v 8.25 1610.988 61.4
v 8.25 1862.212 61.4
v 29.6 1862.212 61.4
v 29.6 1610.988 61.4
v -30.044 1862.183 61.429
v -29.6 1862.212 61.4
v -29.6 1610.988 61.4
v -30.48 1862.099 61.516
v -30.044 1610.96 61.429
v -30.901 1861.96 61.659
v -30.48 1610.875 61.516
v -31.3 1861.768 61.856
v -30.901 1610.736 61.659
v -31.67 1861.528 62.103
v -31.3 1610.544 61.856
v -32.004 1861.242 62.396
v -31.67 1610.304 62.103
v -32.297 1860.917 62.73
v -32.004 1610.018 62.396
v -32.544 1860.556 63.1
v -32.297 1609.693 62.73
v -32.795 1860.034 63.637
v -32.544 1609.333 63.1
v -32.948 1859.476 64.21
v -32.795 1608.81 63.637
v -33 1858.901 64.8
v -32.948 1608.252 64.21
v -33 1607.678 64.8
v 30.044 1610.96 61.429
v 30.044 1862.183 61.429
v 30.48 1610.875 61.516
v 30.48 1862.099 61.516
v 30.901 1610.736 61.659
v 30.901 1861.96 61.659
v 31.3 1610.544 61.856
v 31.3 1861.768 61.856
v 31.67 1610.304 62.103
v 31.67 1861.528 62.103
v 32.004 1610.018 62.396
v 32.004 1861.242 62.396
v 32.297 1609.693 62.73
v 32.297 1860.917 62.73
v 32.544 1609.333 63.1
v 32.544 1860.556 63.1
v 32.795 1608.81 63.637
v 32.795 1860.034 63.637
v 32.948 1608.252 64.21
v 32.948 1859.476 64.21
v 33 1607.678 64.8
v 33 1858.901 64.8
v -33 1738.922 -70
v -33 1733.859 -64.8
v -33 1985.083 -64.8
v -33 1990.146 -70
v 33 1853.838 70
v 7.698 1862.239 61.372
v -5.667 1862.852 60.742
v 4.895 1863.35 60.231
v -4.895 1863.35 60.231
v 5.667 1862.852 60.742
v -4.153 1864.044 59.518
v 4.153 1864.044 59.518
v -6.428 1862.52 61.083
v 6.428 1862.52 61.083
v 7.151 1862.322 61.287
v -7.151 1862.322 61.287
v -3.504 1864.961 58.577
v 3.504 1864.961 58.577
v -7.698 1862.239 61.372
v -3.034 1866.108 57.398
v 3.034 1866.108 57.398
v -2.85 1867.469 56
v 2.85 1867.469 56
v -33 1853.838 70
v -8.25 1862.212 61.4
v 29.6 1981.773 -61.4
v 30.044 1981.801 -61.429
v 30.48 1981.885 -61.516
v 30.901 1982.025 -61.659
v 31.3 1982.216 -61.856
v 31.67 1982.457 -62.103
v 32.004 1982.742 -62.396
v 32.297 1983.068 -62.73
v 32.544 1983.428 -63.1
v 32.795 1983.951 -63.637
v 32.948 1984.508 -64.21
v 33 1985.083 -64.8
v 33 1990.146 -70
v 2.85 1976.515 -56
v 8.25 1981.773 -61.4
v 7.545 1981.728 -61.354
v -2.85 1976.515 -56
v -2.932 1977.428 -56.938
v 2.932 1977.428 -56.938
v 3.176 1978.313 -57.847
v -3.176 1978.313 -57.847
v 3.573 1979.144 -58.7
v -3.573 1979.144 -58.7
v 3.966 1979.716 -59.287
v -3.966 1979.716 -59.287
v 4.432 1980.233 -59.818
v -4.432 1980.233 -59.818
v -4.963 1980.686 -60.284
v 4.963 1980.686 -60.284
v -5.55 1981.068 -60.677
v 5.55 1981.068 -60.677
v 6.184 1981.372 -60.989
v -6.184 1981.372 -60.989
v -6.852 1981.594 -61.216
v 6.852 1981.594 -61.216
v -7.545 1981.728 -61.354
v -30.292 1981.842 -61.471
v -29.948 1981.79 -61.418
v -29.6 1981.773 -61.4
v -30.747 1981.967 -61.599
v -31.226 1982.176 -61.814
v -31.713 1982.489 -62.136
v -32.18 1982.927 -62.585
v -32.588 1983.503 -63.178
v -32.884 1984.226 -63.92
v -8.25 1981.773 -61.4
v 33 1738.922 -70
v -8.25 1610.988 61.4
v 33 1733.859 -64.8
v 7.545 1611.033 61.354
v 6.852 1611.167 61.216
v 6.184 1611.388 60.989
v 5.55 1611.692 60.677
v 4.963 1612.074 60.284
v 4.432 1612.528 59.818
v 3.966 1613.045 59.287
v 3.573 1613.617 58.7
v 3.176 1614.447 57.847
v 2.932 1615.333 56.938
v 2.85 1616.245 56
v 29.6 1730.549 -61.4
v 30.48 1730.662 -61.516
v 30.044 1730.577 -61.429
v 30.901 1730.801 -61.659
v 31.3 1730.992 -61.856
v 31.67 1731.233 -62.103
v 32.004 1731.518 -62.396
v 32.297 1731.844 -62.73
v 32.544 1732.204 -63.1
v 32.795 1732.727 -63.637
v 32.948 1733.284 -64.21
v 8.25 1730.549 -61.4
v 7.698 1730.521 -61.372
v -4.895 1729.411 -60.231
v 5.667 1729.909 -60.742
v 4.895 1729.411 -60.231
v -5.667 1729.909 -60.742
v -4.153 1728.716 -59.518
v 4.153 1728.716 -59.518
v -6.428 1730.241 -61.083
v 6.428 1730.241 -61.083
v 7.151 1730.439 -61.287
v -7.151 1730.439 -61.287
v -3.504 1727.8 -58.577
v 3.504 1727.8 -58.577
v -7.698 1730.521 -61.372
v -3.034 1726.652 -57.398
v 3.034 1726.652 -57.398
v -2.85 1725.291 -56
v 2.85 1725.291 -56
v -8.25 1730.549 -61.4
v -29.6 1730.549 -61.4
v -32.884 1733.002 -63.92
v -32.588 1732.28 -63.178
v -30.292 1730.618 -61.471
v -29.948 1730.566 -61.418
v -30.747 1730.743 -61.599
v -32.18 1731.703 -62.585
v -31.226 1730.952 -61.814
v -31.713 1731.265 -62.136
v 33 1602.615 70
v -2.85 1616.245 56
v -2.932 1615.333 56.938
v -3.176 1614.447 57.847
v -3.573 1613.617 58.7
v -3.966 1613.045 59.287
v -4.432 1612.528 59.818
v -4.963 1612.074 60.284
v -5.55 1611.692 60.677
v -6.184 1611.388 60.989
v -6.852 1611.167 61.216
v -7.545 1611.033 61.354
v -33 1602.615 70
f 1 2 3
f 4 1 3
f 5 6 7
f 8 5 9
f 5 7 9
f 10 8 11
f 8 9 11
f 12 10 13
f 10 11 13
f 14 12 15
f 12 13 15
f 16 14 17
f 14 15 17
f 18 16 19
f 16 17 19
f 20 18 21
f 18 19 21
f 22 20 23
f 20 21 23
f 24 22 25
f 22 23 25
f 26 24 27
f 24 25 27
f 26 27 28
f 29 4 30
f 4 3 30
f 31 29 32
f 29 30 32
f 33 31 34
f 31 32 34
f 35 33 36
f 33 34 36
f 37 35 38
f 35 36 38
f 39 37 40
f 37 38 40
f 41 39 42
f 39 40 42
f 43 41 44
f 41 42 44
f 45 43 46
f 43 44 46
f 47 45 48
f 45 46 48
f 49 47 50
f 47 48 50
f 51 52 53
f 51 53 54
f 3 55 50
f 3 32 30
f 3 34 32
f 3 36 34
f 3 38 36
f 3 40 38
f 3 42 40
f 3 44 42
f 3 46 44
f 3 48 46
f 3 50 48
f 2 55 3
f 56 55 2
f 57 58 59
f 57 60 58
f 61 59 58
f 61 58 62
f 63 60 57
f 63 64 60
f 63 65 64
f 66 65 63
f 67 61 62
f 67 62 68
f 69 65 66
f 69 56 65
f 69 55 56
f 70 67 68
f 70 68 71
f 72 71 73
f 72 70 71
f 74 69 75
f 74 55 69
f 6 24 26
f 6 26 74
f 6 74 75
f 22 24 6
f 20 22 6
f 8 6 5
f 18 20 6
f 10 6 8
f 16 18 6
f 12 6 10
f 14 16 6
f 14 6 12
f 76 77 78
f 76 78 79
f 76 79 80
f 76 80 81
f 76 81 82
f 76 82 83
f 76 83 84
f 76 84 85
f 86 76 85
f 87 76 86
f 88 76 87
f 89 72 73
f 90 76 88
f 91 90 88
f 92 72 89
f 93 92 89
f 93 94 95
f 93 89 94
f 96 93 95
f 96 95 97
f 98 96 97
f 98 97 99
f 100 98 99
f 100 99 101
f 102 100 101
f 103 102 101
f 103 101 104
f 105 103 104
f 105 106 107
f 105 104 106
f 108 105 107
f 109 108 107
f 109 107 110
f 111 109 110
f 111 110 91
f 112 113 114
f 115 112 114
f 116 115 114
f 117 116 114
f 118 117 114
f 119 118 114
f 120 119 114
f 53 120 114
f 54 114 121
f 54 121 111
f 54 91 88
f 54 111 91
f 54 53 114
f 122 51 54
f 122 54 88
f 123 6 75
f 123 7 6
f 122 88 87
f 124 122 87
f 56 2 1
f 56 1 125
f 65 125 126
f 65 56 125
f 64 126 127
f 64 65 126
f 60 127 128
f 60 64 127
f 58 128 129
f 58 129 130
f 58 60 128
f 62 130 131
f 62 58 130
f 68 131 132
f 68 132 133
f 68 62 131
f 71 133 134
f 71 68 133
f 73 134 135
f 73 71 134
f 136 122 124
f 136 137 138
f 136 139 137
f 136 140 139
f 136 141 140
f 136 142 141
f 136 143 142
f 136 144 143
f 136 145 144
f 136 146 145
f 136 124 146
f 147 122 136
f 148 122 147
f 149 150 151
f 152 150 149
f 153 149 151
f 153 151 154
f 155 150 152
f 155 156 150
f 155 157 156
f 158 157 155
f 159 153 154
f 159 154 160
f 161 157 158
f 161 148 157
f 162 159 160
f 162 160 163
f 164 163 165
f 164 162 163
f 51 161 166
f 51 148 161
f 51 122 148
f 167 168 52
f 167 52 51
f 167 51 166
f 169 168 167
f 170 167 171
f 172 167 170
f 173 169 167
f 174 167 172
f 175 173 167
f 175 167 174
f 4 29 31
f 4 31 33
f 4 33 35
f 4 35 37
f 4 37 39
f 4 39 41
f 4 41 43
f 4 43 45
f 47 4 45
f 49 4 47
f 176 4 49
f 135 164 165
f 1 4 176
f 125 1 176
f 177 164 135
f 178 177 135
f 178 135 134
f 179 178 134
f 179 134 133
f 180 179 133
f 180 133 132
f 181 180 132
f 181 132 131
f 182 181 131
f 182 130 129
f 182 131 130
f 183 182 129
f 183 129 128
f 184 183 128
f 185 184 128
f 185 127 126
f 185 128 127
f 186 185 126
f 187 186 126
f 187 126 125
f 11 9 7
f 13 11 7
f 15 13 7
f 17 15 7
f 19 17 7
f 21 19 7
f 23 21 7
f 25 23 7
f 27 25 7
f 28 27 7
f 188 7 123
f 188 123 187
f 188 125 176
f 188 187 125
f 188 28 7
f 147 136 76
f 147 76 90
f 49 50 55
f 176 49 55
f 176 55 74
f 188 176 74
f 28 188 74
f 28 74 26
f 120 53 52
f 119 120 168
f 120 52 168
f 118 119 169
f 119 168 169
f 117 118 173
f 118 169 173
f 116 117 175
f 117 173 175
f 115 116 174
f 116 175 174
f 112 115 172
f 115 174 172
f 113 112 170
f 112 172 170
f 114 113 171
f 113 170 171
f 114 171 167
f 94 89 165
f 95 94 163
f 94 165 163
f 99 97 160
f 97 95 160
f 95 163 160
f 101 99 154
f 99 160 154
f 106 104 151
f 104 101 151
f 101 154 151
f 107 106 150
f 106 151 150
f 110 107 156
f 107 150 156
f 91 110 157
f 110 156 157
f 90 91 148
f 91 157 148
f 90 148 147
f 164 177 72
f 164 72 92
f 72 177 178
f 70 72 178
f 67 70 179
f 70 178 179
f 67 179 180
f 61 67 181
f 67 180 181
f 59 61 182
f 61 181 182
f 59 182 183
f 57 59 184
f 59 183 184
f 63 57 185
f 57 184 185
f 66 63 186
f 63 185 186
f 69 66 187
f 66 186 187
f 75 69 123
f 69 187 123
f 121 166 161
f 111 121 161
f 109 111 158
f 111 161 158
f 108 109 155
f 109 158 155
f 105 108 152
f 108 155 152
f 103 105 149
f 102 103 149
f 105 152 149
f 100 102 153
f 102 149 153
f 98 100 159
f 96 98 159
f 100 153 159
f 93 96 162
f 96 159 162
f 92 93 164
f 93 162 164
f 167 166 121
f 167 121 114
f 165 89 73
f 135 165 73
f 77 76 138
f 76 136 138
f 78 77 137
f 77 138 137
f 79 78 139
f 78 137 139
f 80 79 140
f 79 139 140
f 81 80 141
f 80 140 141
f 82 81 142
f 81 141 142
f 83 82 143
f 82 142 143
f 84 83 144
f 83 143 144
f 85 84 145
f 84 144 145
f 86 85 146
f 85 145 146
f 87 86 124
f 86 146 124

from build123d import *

# Parameters (mm, degrees)
F1_DEPTH      = 2250
F3_R          = 5.4
F4_DEPTH      = 33.001
F4_DEPTH_BACK = 33.001
F6_DEPTH      = 33.001
F6_DEPTH_BACK = 33.001
F7_R          = 3.4


with BuildPart() as f1:
    # F0 (on Front) → F1 (new body, symmetric)
    with BuildSketch(Plane.XZ):
        Polygon((33, 70), (-33, 70), (-33, 61.4), (-2.85, 61.4), (-2.85, -61.4), (-33, -61.4), (-33, -70), (33, -70), (33, -61.4), (2.85, -61.4), (2.85, 61.4), (33, 61.4), align=None)
    extrude(amount=F1_DEPTH, both=True)

    # F3
    f3_edges = [f1.edges().sort_by_distance(p)[0] for p in [
        (2.85, 0, 61.4),
        (-2.85, 0, 61.4),
        (-2.85, 0, -61.4),
        (2.85, 0, -61.4),
    ]]
    fillet(f3_edges, radius=F3_R)

    # F2 (on Right) → F4 (cut, two sides)
    with BuildSketch(Plane.YZ) as f4_sk:
        Polygon((2250, 70), (450.7170761245, -1681.8248605672), (2250, -1681.8248605672), align=None)
        Polygon((450.7170761245, -1681.8248605672), (-1254.9014796783, 70), (-2250, 70), (-2250, -1681.8248605672), align=None)
    extrude(amount=-F4_DEPTH, mode=Mode.SUBTRACT)
    extrude(f4_sk.sketch, amount=F4_DEPTH_BACK, mode=Mode.SUBTRACT)

    # F5 (on Right) → F6 (cut, two sides)
    with BuildSketch(Plane.YZ) as f6_sk:
        Polygon((1738.922081788, -70), (1602.614735553, 70), (-1254.9014796783, 70), (-1118.5941334433, -70), align=None)
        Polygon((1853.8384793795, 70), (1990.1458256145, -70), (2106.2073098671, -70), (2250, 70), align=None)
    extrude(amount=-F6_DEPTH, mode=Mode.SUBTRACT)
    extrude(f6_sk.sketch, amount=F6_DEPTH_BACK, mode=Mode.SUBTRACT)

    # F7
    f7_edges = [f1.edges().sort_by_distance(p)[0] for p in [
        (-33, 1856.160788, -61.4),
        (-33, 1736.599773, 61.4),
        (33, 1856.160788, -61.4),
        (33, 1736.599773, 61.4),
    ]]
    fillet(f7_edges, radius=F7_R)


solid = f1.part
